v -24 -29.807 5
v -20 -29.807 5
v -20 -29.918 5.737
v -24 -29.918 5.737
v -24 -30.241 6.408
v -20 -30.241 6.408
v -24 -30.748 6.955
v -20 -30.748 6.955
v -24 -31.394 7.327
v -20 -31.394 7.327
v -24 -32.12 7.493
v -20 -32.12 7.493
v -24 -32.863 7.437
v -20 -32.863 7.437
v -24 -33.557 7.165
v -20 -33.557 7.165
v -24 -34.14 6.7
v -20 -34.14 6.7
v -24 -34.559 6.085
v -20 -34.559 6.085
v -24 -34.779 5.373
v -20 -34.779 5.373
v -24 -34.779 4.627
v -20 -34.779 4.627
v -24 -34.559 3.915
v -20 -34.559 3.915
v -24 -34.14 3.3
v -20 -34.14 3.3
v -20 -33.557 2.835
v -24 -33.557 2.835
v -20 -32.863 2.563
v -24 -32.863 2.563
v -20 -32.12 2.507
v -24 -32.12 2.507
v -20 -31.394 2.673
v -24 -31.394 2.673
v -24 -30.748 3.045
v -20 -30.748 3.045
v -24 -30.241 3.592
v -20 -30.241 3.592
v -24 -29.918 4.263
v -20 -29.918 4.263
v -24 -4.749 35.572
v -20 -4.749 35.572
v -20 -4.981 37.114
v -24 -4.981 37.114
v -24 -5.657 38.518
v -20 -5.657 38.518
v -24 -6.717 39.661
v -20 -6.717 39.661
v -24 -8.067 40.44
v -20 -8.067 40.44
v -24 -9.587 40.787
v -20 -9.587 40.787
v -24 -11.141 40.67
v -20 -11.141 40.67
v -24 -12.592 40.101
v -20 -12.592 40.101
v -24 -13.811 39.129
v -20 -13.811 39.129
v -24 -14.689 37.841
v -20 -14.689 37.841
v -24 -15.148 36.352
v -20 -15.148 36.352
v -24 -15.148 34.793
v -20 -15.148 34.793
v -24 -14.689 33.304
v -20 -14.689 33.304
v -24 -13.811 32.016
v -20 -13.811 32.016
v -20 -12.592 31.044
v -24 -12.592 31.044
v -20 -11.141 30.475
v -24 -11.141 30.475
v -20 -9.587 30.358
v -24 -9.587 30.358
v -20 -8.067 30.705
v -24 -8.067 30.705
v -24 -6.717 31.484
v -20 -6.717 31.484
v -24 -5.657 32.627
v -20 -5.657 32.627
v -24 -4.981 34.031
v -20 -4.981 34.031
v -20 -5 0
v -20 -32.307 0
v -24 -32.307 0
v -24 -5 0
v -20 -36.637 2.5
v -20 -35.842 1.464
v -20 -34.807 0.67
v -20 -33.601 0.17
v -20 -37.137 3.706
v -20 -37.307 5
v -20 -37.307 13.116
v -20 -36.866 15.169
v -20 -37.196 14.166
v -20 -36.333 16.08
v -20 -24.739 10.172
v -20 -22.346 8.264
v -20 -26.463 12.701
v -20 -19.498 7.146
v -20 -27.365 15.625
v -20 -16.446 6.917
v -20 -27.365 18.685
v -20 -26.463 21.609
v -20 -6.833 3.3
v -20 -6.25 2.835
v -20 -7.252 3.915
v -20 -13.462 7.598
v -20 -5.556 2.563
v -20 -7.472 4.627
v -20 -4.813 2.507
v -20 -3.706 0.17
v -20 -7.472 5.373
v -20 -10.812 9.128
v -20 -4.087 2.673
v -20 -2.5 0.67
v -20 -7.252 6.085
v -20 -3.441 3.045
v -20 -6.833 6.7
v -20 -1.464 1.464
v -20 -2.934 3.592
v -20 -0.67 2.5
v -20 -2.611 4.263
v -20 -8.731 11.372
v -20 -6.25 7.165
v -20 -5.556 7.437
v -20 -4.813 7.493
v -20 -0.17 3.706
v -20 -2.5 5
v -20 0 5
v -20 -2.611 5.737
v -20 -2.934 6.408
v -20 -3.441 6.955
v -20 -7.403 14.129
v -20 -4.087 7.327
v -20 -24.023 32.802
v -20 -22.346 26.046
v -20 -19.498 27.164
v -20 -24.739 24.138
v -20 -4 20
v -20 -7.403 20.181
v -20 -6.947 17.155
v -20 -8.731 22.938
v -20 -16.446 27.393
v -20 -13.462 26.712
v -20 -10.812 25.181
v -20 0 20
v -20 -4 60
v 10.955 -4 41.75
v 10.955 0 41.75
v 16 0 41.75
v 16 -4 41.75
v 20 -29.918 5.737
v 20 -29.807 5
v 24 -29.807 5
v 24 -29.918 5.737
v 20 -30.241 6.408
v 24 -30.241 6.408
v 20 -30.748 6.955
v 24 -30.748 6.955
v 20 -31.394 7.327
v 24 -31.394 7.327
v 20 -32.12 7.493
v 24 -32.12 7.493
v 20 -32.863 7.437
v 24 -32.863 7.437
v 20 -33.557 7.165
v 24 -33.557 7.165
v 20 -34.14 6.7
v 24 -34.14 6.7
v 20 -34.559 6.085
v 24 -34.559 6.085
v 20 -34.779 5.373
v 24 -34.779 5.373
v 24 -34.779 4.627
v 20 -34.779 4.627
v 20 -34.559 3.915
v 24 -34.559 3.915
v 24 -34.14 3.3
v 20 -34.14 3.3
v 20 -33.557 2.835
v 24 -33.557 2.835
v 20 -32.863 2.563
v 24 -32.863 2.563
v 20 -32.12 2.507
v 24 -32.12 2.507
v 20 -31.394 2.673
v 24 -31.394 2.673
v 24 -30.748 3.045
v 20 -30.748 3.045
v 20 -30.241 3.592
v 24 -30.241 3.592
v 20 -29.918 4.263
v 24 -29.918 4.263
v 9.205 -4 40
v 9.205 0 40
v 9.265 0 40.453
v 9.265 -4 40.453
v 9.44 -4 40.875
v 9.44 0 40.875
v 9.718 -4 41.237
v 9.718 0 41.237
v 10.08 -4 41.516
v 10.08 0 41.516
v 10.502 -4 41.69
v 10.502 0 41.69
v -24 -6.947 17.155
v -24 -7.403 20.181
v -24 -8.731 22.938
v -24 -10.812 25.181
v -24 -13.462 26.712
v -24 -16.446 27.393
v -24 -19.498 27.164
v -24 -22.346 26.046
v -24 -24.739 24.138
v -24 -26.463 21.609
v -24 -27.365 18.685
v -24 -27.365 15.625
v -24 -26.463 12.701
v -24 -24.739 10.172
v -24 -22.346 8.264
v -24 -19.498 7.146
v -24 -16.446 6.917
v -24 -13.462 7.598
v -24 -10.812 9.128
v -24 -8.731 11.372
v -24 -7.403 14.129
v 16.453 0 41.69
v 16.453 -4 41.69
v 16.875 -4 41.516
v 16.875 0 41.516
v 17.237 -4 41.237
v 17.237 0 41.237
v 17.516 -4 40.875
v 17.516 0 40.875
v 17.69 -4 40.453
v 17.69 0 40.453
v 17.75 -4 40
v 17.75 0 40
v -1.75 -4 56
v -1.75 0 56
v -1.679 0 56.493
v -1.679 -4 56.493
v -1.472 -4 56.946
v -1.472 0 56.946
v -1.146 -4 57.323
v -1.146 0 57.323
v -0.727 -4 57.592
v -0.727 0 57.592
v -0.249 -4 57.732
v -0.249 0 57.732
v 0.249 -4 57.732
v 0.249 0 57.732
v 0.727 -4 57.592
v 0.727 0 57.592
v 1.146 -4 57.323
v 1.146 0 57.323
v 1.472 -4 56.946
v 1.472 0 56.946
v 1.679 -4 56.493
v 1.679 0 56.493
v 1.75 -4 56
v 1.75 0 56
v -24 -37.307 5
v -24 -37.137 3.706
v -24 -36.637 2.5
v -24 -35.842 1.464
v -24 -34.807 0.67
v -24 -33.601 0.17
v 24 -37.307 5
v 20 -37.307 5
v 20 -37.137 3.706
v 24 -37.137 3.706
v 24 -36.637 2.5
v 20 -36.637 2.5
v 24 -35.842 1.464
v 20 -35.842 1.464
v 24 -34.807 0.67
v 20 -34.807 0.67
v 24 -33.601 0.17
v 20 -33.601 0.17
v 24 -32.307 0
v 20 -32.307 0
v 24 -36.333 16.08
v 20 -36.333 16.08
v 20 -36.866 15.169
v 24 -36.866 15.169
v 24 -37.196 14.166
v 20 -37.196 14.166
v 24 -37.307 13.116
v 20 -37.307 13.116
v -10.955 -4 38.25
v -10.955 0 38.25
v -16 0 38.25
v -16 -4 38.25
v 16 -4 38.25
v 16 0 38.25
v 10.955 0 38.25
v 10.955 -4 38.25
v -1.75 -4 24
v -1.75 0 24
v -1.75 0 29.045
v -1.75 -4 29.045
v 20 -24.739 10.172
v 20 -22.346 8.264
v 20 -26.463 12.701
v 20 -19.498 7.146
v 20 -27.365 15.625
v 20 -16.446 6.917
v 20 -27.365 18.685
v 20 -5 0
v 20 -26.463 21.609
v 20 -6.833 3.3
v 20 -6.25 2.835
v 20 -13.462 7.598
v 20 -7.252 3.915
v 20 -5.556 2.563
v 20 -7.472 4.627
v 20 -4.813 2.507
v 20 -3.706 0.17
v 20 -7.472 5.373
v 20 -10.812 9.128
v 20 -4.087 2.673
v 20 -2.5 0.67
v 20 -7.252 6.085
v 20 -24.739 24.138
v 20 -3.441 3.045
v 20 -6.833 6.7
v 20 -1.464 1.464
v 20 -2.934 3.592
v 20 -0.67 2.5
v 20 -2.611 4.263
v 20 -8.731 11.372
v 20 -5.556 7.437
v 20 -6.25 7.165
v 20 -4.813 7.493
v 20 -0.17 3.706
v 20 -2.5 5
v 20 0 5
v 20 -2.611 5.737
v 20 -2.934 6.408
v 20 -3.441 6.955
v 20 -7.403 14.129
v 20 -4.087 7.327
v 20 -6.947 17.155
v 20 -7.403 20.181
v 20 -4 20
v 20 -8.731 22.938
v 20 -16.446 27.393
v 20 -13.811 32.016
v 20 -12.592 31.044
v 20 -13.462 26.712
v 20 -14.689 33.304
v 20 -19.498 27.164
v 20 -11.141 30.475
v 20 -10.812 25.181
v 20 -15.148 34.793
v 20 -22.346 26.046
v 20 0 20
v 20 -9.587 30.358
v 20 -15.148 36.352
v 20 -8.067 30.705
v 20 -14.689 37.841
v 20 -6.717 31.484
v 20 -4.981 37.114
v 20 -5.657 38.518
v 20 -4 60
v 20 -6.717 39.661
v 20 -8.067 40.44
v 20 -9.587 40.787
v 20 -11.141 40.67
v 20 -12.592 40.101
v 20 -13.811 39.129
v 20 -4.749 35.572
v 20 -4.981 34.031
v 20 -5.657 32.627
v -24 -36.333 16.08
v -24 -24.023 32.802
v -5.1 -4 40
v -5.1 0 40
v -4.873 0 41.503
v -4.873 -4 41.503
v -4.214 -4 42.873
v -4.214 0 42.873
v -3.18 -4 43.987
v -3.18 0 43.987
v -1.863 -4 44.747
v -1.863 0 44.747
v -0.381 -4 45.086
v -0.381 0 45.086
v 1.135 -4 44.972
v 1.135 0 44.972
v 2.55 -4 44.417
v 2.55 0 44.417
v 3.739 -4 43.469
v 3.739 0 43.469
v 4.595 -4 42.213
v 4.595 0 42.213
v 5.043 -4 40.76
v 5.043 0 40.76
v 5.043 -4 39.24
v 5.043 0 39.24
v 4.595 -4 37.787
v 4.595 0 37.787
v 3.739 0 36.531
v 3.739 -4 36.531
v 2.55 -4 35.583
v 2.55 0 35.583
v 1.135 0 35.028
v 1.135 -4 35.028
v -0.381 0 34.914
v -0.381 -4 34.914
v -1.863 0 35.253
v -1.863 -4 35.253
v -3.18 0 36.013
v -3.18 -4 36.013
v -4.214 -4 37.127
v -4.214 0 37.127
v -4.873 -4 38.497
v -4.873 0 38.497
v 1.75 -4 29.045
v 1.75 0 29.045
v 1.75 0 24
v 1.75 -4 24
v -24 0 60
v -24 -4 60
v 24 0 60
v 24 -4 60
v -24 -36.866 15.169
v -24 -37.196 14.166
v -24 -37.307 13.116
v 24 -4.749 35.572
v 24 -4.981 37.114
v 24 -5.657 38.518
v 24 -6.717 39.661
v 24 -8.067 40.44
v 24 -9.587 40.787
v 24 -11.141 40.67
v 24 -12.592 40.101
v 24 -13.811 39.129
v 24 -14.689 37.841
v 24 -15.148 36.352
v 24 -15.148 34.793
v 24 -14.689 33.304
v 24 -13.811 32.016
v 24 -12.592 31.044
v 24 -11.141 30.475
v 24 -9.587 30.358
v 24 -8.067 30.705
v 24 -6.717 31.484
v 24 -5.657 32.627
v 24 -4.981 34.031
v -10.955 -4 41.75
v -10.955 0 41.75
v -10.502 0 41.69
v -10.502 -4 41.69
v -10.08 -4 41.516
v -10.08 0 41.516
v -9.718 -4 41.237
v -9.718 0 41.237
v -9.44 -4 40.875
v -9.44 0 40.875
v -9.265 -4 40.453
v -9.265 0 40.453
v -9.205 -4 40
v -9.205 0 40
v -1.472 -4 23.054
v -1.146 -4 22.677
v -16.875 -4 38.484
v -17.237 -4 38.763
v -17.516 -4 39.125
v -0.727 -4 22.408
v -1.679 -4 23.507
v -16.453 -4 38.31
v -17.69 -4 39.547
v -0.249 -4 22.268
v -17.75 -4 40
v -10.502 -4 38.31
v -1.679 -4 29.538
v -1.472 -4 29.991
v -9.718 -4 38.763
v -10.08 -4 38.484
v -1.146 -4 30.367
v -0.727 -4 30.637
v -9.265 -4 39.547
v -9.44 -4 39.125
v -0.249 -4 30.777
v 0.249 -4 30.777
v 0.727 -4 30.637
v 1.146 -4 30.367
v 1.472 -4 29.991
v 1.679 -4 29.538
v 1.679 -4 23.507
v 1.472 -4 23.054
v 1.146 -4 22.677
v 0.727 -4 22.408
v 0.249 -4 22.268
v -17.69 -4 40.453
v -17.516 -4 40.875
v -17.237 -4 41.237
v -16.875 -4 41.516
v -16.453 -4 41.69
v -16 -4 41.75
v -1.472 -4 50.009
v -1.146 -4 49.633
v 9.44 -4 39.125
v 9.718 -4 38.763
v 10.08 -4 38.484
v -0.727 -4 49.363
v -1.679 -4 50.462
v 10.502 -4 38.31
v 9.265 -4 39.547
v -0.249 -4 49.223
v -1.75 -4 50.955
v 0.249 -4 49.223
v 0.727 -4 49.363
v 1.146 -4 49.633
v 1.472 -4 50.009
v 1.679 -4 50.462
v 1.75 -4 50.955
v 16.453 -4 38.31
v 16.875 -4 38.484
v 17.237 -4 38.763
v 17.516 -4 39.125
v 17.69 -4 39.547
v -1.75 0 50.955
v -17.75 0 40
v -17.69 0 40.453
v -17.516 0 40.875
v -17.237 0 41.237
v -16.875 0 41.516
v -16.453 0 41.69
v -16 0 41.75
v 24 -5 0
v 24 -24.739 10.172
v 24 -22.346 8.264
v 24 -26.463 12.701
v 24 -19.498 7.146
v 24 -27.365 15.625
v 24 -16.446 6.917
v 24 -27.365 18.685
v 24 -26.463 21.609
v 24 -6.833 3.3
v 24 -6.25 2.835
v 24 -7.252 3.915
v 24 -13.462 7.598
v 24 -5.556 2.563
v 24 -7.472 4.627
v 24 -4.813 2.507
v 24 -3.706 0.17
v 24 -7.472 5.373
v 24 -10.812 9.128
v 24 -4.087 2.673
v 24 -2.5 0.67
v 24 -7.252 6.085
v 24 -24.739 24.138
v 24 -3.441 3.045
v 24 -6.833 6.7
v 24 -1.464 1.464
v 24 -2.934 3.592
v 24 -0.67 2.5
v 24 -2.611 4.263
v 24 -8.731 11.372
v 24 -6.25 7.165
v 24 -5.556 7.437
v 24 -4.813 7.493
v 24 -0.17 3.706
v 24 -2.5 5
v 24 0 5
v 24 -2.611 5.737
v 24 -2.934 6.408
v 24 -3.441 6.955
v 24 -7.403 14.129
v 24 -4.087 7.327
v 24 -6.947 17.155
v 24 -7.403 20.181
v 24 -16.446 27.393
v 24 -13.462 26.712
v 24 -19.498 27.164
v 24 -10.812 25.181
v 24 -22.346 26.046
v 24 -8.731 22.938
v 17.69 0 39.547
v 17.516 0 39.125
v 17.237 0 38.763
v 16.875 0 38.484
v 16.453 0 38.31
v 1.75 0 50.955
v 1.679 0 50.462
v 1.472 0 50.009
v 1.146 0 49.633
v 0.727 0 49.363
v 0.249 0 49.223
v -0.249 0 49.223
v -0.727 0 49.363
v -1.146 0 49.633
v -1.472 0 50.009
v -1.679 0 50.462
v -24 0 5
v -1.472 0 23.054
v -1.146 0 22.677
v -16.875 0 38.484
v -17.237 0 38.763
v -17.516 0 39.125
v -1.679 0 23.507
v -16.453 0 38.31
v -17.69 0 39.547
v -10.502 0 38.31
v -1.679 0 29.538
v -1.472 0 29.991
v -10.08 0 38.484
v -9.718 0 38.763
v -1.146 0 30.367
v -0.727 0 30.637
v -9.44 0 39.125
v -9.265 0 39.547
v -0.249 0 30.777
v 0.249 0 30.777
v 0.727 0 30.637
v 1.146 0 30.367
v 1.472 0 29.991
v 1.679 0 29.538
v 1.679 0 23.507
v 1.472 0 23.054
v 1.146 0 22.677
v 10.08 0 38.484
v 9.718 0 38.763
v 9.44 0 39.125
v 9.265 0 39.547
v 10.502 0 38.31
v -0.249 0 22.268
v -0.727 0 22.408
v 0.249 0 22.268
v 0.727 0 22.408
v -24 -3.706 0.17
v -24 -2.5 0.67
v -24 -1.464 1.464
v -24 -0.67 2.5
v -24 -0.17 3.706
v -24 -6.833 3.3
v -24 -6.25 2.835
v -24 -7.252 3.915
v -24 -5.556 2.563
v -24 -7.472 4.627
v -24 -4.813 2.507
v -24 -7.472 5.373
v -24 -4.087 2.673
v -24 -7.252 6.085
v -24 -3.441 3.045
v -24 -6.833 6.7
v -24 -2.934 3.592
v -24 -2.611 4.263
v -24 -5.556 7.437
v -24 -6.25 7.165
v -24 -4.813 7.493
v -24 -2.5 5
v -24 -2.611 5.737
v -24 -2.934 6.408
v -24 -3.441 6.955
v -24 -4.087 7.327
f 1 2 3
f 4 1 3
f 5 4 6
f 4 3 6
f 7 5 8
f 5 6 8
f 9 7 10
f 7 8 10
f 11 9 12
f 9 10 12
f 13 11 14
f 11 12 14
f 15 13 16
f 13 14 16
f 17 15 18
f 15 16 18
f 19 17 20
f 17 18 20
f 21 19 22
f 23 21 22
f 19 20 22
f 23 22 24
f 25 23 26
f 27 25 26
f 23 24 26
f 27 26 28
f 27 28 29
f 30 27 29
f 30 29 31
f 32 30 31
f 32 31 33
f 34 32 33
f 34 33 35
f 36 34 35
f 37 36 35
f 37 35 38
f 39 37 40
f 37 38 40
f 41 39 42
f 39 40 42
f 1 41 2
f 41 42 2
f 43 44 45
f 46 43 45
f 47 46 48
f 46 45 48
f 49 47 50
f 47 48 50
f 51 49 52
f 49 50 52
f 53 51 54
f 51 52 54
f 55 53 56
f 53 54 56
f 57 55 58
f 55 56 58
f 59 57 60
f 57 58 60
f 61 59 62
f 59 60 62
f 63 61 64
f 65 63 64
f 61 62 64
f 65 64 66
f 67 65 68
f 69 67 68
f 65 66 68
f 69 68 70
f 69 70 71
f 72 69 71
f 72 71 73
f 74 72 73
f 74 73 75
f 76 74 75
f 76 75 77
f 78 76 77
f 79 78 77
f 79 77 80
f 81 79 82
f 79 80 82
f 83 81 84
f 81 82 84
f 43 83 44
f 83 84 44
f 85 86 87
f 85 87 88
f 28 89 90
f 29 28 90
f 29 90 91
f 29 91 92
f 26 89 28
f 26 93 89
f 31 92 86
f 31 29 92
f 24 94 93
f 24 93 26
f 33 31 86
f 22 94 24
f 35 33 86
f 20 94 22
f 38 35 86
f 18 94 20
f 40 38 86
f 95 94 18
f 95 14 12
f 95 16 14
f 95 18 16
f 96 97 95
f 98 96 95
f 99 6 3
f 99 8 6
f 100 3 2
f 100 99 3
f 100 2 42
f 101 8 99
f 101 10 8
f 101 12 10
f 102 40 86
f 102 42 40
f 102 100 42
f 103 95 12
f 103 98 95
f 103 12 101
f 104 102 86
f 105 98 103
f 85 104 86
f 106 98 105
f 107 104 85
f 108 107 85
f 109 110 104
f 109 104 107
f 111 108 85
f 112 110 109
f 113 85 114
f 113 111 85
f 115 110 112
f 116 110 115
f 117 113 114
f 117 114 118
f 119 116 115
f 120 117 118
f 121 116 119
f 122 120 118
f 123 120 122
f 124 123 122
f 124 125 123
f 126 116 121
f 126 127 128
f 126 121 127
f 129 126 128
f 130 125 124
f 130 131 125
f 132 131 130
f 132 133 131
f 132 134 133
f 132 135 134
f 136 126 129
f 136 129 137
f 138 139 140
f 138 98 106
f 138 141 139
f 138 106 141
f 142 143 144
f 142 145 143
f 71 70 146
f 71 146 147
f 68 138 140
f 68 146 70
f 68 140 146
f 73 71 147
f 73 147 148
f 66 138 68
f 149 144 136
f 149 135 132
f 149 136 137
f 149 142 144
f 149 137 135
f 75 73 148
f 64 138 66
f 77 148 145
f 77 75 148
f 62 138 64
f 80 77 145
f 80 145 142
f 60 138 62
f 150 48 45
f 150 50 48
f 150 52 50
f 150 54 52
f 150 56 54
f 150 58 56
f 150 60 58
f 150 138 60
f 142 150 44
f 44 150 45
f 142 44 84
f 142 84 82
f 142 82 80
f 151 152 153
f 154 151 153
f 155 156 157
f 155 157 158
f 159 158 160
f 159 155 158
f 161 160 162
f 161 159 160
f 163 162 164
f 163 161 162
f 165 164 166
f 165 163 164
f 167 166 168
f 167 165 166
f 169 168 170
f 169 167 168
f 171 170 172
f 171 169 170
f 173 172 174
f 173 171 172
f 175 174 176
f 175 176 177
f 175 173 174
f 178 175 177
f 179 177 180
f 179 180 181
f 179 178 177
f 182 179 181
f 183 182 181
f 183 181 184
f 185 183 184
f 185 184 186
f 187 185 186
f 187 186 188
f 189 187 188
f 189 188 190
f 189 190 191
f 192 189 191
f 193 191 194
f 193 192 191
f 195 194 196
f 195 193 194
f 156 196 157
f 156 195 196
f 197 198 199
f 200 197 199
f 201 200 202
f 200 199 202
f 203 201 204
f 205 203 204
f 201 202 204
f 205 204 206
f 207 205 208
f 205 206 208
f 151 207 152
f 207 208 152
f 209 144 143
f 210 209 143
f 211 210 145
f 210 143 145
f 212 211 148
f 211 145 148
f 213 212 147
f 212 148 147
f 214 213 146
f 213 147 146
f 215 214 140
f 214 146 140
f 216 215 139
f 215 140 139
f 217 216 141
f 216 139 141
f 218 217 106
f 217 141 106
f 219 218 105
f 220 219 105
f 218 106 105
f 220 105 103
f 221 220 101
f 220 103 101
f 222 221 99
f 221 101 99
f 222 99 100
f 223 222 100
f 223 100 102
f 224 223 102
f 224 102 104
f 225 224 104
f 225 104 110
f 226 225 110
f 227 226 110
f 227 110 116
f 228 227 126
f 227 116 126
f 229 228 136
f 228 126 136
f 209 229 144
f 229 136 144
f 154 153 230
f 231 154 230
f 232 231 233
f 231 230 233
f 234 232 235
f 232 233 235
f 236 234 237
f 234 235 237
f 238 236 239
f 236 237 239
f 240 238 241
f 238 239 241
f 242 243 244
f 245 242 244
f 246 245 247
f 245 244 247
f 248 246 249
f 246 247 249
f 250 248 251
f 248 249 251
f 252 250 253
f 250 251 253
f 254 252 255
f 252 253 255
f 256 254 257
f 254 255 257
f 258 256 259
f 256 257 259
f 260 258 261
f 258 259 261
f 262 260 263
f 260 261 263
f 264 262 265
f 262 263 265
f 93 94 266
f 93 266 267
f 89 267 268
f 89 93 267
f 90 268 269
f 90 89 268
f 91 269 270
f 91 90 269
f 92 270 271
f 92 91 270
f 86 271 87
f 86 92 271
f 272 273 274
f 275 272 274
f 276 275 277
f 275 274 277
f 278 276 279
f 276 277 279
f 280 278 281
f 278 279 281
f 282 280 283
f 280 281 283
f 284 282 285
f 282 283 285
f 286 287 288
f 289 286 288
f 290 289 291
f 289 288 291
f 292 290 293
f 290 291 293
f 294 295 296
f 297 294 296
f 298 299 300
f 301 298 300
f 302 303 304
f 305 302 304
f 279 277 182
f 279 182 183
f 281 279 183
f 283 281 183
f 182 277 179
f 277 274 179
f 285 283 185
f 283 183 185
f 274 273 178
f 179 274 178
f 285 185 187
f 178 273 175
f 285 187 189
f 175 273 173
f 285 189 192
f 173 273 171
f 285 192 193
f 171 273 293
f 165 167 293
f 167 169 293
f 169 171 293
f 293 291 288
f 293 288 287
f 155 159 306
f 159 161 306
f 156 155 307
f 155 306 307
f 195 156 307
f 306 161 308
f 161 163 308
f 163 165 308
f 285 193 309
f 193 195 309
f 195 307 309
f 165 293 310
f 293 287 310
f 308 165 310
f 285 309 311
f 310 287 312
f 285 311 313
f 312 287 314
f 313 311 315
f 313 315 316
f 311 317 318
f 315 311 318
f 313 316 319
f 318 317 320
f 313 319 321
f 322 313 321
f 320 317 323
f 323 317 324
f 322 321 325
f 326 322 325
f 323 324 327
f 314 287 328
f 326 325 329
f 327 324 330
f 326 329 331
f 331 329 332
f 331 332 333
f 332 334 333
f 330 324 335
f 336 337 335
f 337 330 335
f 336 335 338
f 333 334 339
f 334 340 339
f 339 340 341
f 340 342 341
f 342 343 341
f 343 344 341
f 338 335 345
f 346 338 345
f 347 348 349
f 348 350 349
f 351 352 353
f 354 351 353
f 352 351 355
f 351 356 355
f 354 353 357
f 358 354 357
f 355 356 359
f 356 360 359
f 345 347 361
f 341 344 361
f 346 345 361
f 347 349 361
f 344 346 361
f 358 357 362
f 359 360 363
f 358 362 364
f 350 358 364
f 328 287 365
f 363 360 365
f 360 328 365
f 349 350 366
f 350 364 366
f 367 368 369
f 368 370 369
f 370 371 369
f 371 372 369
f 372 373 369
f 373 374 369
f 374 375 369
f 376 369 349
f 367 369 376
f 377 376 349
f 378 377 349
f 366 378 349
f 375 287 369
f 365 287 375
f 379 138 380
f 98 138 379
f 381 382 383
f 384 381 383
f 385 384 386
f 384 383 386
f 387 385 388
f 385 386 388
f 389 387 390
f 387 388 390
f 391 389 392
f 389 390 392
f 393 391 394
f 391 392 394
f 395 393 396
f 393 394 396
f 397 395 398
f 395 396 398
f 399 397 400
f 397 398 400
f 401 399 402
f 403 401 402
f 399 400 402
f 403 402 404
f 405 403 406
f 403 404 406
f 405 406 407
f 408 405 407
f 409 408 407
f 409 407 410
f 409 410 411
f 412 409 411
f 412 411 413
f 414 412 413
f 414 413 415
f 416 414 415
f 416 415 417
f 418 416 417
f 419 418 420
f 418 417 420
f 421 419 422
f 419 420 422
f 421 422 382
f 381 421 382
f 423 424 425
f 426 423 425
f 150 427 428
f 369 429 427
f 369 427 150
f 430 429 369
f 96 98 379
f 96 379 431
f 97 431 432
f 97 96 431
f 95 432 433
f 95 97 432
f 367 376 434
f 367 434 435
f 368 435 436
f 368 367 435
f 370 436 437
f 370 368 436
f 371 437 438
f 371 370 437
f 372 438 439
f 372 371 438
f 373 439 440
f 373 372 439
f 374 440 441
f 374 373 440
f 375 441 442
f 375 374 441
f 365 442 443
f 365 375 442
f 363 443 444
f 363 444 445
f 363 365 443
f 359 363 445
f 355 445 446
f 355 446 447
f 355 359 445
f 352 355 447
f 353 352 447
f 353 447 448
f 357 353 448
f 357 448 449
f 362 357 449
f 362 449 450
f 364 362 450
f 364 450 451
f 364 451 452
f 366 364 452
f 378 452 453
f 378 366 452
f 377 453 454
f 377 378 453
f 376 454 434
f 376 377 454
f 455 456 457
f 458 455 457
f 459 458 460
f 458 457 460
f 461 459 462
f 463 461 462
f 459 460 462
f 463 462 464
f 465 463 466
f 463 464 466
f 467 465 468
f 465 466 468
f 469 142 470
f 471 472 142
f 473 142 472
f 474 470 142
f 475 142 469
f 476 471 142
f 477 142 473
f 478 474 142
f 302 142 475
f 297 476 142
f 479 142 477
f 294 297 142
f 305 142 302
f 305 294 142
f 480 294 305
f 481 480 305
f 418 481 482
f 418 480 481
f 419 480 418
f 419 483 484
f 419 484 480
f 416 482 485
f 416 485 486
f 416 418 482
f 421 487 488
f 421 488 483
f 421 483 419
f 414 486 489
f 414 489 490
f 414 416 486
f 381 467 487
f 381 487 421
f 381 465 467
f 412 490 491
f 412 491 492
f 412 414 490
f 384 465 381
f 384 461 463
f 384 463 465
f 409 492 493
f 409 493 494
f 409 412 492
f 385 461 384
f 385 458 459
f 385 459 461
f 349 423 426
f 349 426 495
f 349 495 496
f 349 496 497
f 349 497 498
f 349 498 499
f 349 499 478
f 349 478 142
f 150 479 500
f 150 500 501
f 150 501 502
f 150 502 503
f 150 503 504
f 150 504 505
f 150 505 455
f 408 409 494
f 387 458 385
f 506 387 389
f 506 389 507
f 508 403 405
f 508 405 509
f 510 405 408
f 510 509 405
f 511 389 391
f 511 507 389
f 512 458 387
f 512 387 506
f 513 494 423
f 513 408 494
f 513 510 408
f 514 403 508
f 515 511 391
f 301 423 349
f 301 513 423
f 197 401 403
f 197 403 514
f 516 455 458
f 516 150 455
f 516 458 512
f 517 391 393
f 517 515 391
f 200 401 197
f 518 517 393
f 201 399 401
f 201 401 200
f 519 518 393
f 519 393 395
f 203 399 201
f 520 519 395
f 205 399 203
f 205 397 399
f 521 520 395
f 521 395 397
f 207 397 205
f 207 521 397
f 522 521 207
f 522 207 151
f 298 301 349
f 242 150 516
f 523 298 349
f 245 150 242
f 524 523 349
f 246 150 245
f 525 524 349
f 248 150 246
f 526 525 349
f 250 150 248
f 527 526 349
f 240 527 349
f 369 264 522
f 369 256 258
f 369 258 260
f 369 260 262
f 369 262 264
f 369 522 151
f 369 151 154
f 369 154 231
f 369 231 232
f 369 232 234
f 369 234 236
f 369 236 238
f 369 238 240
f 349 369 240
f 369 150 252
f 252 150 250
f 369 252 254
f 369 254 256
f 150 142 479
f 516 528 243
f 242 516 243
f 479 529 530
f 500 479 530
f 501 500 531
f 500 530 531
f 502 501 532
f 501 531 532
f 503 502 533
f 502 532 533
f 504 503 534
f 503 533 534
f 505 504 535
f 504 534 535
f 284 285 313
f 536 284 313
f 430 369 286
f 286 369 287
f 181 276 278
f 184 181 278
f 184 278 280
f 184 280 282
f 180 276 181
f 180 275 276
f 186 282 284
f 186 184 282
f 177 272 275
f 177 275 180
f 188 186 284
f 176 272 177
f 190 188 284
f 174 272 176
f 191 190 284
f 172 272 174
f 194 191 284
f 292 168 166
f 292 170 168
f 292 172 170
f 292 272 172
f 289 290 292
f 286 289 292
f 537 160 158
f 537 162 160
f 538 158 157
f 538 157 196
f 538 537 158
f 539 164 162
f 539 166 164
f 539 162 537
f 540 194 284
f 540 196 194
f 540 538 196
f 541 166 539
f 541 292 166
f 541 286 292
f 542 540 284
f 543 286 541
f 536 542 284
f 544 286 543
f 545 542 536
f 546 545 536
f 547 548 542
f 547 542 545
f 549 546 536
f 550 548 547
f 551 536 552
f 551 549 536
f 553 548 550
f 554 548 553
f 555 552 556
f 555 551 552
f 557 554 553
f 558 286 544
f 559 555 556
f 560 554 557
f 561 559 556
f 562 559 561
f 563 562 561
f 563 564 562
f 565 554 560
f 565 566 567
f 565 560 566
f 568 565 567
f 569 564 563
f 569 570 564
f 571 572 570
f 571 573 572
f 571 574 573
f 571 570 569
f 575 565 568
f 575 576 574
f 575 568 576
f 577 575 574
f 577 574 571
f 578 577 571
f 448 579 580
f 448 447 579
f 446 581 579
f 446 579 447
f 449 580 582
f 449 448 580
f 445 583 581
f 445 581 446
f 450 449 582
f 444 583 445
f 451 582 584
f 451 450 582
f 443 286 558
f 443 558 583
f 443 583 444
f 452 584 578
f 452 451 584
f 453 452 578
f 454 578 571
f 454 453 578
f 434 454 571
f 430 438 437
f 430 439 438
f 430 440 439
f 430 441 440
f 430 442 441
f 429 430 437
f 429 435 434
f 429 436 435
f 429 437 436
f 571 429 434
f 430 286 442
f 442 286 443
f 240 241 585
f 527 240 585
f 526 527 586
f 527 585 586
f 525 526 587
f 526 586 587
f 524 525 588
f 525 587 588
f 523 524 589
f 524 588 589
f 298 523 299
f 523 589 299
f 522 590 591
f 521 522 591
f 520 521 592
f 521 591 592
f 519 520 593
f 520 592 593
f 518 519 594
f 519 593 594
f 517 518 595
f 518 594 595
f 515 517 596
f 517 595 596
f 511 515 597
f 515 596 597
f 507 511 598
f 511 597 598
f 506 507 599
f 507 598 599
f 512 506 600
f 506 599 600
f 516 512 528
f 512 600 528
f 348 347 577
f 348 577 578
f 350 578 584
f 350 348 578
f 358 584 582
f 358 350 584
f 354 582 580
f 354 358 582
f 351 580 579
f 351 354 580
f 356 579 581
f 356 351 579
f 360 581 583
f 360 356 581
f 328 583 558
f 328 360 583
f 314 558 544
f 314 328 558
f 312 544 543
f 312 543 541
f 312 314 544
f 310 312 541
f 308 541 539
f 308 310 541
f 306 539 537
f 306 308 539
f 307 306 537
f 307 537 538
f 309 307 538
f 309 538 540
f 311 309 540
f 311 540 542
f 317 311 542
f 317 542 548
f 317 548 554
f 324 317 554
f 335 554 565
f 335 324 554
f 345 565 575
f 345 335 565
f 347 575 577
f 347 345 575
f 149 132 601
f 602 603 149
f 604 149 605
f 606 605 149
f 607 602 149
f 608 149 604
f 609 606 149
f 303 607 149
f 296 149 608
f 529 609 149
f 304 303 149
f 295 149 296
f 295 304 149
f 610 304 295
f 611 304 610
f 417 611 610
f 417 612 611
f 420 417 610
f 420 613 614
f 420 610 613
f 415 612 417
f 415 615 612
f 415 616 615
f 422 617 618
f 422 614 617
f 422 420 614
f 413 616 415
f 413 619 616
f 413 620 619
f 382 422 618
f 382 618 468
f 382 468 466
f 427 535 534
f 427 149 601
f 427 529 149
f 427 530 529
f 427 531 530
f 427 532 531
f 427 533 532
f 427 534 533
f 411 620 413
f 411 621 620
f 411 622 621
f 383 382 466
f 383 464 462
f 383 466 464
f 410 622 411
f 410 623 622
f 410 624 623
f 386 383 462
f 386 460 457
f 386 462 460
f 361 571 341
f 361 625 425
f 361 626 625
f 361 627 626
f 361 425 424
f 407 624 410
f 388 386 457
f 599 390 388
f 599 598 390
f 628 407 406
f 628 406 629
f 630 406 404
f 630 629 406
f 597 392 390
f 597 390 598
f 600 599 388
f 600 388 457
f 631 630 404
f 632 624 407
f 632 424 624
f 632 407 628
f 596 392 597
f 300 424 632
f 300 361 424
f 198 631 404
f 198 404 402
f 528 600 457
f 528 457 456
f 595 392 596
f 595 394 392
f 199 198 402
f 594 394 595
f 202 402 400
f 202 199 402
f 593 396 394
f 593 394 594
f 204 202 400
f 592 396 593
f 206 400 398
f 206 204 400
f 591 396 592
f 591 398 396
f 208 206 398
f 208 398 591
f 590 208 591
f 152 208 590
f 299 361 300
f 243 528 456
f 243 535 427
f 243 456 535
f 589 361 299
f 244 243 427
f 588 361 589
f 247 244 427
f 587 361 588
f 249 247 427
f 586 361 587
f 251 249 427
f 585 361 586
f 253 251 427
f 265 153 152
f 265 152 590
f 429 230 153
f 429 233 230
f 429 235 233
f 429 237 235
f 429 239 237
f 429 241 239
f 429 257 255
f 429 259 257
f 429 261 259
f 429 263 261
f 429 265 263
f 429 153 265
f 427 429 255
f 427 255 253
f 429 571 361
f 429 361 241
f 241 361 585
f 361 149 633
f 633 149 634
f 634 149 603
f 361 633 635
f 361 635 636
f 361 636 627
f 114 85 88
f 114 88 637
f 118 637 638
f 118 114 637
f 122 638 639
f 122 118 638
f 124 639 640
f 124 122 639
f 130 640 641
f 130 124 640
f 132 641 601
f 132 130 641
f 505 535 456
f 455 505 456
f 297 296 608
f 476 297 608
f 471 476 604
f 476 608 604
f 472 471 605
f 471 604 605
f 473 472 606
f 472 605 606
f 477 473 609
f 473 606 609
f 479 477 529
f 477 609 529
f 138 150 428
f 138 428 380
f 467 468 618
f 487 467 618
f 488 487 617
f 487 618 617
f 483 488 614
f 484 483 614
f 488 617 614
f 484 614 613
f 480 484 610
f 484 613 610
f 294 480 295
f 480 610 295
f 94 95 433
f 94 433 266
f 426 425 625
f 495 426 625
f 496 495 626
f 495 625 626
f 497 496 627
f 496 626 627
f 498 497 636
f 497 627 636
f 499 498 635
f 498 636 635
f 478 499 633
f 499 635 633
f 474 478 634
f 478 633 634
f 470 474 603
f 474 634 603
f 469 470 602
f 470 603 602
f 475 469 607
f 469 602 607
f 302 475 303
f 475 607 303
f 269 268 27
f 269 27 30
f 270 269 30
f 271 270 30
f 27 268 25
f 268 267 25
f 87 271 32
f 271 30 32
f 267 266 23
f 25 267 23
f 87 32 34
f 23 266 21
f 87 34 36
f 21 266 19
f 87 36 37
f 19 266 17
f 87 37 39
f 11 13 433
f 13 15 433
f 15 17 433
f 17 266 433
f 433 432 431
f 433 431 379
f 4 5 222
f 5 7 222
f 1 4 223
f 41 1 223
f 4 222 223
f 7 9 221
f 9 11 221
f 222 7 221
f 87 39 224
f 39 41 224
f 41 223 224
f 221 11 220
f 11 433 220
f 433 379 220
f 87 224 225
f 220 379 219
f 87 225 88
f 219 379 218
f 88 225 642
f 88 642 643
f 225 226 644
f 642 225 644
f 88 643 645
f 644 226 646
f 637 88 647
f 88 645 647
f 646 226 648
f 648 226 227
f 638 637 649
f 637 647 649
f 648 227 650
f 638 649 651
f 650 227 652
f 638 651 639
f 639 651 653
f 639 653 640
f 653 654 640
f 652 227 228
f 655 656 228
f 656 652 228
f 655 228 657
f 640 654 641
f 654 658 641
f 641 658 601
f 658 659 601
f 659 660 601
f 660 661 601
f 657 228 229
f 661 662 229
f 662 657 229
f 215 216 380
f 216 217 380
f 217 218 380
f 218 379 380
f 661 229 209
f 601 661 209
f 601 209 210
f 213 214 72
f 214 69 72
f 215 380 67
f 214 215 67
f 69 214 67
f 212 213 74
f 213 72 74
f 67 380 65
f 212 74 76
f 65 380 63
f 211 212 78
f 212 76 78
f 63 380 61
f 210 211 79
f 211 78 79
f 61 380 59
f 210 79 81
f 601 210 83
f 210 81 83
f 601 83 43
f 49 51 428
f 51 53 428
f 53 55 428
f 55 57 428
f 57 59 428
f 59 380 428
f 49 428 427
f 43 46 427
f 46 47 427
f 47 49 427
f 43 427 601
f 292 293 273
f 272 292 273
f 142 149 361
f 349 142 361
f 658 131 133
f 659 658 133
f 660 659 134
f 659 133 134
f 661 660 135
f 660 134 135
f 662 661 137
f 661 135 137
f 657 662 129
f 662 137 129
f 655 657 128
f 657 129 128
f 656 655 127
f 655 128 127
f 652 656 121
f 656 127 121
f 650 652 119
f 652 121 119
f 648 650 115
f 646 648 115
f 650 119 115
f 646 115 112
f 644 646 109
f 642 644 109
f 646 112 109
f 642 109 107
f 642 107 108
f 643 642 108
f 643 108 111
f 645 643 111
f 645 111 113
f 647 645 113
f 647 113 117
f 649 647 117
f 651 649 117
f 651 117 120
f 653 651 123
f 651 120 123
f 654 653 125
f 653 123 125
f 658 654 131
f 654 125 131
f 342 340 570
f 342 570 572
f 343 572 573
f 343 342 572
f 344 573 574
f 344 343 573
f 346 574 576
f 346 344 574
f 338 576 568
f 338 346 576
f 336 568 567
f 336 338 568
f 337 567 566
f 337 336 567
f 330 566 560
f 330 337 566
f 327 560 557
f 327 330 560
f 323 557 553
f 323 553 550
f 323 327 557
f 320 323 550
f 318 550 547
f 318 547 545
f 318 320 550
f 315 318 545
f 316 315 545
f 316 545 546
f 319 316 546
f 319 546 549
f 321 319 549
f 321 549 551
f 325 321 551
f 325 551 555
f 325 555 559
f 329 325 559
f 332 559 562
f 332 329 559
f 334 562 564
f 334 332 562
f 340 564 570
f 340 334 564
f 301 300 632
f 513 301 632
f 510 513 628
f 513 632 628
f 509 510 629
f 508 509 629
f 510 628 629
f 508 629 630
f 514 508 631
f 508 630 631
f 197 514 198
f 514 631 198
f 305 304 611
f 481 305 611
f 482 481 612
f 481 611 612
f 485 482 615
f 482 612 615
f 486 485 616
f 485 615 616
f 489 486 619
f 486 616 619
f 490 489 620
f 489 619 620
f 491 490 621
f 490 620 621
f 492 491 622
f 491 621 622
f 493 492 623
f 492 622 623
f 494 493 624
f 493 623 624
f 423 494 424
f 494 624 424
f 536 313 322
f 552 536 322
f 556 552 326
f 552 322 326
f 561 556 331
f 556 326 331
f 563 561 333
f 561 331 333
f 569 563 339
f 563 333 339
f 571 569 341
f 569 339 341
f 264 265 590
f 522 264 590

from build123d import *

# Parameters (mm, degrees)
F1_DEPTH = 4
F2_R     = 2.5
F2_R_2   = 10.2663789445
F2_R_3   = 5.2288220919
F3_DEPTH = 4
F5_R     = 2.5
F5_R_2   = 10.2663789445
F5_R_3   = 5.2288220919
F6_DEPTH = 4


with BuildPart() as f1:
    # F0 (on Front) → F1 (new body)
    with BuildSketch(Plane.XZ):
        with BuildLine():
            Line((9.2053477168, 40), (5.1, 40))
            ThreePointArc((5.1, 40), (0, 34.9), (-5.1, 40))
            Line((-5.1, 40), (-9.2053477168, 40))
            ThreePointArc((-9.2053477168, 40), (-9.7179108497, 38.7625631329), (-10.9553477168, 38.25))
            Line((-10.9553477168, 38.25), (-16, 38.25))
            ThreePointArc((-16, 38.25), (-17.2374368671, 38.7625631329), (-17.75, 40))
            Line((-17.75, 40), (-20, 40))
            Line((-20, 40), (-20, 20))
            Line((-20, 20), (20, 20))
            Line((20, 20), (20, 40))
            Line((20, 40), (17.75, 40))
            ThreePointArc((17.75, 40), (17.2374368671, 38.7625631329), (16, 38.25))
            Line((16, 38.25), (10.9553477168, 38.25))
            ThreePointArc((10.9553477168, 38.25), (9.7179108497, 38.7625631329), (9.2053477168, 40))
        make_face()
        with BuildLine():
            Line((1.75, 29.0446522832), (1.75, 24))
            ThreePointArc((1.75, 24), (0, 22.25), (-1.75, 24))
            Line((-1.75, 24), (-1.75, 29.0446522832))
            ThreePointArc((-1.75, 29.0446522832), (0, 30.7946522832), (1.75, 29.0446522832))
        make_face(mode=Mode.SUBTRACT)
        with BuildLine():
            ThreePointArc((-5.1, 40), (0, 45.1), (5.1, 40))
            Line((5.1, 40), (9.2053477168, 40))
            ThreePointArc((9.2053477168, 40), (9.7179108497, 41.2374368671), (10.9553477168, 41.75))
            Line((10.9553477168, 41.75), (16, 41.75))
            ThreePointArc((16, 41.75), (17.2374368671, 41.2374368671), (17.75, 40))
            Line((17.75, 40), (20, 40))
            Line((20, 40), (20, 60))
            Line((20, 60), (-20, 60))
            Line((-20, 60), (-20, 40))
            Line((-20, 40), (-17.75, 40))
            ThreePointArc((-17.75, 40), (-17.2374368671, 41.2374368671), (-16, 41.75))
            Line((-16, 41.75), (-10.9553477168, 41.75))
            ThreePointArc((-10.9553477168, 41.75), (-9.7179108497, 41.2374368671), (-9.2053477168, 40))
            Line((-9.2053477168, 40), (-5.1, 40))
        make_face()
        with BuildLine():
            ThreePointArc((1.75, 50.9553477168), (0, 49.2053477168), (-1.75, 50.9553477168))
            Line((-1.75, 50.9553477168), (-1.75, 56))
            ThreePointArc((-1.75, 56), (0, 57.75), (1.75, 56))
            Line((1.75, 56), (1.75, 50.9553477168))
        make_face(mode=Mode.SUBTRACT)
    extrude(amount=F1_DEPTH)

    # F2 (on face) → F3 (join)
    with BuildSketch(Plane.YZ.offset(20)):
        with BuildLine():
            Line((-32.3069637418, 0), (-5, 0))
            ThreePointArc((-5, 0), (-1.4644660941, 1.4644660941), (0, 5))
            Line((0, 5), (0, 60))
            Line((0, 60), (-4, 60))
            Line((-4, 60), (-36.3334842795, 16.0803529313))
            ThreePointArc((-36.3334842795, 16.0803529313), (-37.0573638664, 14.6760747904), (-37.3069637418, 13.1160431703))
            Line((-37.3069637418, 13.1160431703), (-37.3069637418, 5))
            ThreePointArc((-37.3069637418, 5), (-35.8424976477, 1.4644660941), (-32.3069637418, 0))
        make_face()
        with Locations((-32.3069637418, 5)):
            Circle(F2_R, mode=Mode.SUBTRACT)
        with Locations((-5, 5)):
            Circle(F2_R, mode=Mode.SUBTRACT)
        with Locations((-17.2130409628, 17.1549171209)):
            Circle(F2_R_2, mode=Mode.SUBTRACT)
        with Locations((-9.977567941, 35.5724841356)):
            Circle(F2_R_3, mode=Mode.SUBTRACT)
    extrude(amount=F3_DEPTH)

    # F5 (on 3pt) → F6 (join)
    with BuildSketch(Plane.YZ.offset(-20)):
        with BuildLine():
            Line((-32.3069637418, 0), (-5, 0))
            ThreePointArc((-5, 0), (-1.4644660941, 1.4644660941), (0, 5))
            Line((0, 5), (0, 60))
            Line((0, 60), (-4, 60))
            Line((-4, 60), (-24.0229353611, 32.8021809608))
            Line((-24.0229353611, 32.8021809608), (-36.3334842795, 16.0803529313))
            ThreePointArc((-36.3334842795, 16.0803529313), (-37.0573638664, 14.6760747904), (-37.3069637418, 13.1160431703))
            Line((-37.3069637418, 13.1160431703), (-37.3069637418, 5))
            ThreePointArc((-37.3069637418, 5), (-35.8424976477, 1.4644660941), (-32.3069637418, 0))
        make_face()
        with Locations((-32.3069637418, 5)):
            Circle(F5_R, mode=Mode.SUBTRACT)
        with Locations((-5, 5)):
            Circle(F5_R, mode=Mode.SUBTRACT)
        with Locations((-17.2130409628, 17.1549171209)):
            Circle(F5_R_2, mode=Mode.SUBTRACT)
        with Locations((-9.977567941, 35.5724841356)):
            Circle(F5_R_3, mode=Mode.SUBTRACT)
    extrude(amount=-F6_DEPTH)


solid = f1.part
